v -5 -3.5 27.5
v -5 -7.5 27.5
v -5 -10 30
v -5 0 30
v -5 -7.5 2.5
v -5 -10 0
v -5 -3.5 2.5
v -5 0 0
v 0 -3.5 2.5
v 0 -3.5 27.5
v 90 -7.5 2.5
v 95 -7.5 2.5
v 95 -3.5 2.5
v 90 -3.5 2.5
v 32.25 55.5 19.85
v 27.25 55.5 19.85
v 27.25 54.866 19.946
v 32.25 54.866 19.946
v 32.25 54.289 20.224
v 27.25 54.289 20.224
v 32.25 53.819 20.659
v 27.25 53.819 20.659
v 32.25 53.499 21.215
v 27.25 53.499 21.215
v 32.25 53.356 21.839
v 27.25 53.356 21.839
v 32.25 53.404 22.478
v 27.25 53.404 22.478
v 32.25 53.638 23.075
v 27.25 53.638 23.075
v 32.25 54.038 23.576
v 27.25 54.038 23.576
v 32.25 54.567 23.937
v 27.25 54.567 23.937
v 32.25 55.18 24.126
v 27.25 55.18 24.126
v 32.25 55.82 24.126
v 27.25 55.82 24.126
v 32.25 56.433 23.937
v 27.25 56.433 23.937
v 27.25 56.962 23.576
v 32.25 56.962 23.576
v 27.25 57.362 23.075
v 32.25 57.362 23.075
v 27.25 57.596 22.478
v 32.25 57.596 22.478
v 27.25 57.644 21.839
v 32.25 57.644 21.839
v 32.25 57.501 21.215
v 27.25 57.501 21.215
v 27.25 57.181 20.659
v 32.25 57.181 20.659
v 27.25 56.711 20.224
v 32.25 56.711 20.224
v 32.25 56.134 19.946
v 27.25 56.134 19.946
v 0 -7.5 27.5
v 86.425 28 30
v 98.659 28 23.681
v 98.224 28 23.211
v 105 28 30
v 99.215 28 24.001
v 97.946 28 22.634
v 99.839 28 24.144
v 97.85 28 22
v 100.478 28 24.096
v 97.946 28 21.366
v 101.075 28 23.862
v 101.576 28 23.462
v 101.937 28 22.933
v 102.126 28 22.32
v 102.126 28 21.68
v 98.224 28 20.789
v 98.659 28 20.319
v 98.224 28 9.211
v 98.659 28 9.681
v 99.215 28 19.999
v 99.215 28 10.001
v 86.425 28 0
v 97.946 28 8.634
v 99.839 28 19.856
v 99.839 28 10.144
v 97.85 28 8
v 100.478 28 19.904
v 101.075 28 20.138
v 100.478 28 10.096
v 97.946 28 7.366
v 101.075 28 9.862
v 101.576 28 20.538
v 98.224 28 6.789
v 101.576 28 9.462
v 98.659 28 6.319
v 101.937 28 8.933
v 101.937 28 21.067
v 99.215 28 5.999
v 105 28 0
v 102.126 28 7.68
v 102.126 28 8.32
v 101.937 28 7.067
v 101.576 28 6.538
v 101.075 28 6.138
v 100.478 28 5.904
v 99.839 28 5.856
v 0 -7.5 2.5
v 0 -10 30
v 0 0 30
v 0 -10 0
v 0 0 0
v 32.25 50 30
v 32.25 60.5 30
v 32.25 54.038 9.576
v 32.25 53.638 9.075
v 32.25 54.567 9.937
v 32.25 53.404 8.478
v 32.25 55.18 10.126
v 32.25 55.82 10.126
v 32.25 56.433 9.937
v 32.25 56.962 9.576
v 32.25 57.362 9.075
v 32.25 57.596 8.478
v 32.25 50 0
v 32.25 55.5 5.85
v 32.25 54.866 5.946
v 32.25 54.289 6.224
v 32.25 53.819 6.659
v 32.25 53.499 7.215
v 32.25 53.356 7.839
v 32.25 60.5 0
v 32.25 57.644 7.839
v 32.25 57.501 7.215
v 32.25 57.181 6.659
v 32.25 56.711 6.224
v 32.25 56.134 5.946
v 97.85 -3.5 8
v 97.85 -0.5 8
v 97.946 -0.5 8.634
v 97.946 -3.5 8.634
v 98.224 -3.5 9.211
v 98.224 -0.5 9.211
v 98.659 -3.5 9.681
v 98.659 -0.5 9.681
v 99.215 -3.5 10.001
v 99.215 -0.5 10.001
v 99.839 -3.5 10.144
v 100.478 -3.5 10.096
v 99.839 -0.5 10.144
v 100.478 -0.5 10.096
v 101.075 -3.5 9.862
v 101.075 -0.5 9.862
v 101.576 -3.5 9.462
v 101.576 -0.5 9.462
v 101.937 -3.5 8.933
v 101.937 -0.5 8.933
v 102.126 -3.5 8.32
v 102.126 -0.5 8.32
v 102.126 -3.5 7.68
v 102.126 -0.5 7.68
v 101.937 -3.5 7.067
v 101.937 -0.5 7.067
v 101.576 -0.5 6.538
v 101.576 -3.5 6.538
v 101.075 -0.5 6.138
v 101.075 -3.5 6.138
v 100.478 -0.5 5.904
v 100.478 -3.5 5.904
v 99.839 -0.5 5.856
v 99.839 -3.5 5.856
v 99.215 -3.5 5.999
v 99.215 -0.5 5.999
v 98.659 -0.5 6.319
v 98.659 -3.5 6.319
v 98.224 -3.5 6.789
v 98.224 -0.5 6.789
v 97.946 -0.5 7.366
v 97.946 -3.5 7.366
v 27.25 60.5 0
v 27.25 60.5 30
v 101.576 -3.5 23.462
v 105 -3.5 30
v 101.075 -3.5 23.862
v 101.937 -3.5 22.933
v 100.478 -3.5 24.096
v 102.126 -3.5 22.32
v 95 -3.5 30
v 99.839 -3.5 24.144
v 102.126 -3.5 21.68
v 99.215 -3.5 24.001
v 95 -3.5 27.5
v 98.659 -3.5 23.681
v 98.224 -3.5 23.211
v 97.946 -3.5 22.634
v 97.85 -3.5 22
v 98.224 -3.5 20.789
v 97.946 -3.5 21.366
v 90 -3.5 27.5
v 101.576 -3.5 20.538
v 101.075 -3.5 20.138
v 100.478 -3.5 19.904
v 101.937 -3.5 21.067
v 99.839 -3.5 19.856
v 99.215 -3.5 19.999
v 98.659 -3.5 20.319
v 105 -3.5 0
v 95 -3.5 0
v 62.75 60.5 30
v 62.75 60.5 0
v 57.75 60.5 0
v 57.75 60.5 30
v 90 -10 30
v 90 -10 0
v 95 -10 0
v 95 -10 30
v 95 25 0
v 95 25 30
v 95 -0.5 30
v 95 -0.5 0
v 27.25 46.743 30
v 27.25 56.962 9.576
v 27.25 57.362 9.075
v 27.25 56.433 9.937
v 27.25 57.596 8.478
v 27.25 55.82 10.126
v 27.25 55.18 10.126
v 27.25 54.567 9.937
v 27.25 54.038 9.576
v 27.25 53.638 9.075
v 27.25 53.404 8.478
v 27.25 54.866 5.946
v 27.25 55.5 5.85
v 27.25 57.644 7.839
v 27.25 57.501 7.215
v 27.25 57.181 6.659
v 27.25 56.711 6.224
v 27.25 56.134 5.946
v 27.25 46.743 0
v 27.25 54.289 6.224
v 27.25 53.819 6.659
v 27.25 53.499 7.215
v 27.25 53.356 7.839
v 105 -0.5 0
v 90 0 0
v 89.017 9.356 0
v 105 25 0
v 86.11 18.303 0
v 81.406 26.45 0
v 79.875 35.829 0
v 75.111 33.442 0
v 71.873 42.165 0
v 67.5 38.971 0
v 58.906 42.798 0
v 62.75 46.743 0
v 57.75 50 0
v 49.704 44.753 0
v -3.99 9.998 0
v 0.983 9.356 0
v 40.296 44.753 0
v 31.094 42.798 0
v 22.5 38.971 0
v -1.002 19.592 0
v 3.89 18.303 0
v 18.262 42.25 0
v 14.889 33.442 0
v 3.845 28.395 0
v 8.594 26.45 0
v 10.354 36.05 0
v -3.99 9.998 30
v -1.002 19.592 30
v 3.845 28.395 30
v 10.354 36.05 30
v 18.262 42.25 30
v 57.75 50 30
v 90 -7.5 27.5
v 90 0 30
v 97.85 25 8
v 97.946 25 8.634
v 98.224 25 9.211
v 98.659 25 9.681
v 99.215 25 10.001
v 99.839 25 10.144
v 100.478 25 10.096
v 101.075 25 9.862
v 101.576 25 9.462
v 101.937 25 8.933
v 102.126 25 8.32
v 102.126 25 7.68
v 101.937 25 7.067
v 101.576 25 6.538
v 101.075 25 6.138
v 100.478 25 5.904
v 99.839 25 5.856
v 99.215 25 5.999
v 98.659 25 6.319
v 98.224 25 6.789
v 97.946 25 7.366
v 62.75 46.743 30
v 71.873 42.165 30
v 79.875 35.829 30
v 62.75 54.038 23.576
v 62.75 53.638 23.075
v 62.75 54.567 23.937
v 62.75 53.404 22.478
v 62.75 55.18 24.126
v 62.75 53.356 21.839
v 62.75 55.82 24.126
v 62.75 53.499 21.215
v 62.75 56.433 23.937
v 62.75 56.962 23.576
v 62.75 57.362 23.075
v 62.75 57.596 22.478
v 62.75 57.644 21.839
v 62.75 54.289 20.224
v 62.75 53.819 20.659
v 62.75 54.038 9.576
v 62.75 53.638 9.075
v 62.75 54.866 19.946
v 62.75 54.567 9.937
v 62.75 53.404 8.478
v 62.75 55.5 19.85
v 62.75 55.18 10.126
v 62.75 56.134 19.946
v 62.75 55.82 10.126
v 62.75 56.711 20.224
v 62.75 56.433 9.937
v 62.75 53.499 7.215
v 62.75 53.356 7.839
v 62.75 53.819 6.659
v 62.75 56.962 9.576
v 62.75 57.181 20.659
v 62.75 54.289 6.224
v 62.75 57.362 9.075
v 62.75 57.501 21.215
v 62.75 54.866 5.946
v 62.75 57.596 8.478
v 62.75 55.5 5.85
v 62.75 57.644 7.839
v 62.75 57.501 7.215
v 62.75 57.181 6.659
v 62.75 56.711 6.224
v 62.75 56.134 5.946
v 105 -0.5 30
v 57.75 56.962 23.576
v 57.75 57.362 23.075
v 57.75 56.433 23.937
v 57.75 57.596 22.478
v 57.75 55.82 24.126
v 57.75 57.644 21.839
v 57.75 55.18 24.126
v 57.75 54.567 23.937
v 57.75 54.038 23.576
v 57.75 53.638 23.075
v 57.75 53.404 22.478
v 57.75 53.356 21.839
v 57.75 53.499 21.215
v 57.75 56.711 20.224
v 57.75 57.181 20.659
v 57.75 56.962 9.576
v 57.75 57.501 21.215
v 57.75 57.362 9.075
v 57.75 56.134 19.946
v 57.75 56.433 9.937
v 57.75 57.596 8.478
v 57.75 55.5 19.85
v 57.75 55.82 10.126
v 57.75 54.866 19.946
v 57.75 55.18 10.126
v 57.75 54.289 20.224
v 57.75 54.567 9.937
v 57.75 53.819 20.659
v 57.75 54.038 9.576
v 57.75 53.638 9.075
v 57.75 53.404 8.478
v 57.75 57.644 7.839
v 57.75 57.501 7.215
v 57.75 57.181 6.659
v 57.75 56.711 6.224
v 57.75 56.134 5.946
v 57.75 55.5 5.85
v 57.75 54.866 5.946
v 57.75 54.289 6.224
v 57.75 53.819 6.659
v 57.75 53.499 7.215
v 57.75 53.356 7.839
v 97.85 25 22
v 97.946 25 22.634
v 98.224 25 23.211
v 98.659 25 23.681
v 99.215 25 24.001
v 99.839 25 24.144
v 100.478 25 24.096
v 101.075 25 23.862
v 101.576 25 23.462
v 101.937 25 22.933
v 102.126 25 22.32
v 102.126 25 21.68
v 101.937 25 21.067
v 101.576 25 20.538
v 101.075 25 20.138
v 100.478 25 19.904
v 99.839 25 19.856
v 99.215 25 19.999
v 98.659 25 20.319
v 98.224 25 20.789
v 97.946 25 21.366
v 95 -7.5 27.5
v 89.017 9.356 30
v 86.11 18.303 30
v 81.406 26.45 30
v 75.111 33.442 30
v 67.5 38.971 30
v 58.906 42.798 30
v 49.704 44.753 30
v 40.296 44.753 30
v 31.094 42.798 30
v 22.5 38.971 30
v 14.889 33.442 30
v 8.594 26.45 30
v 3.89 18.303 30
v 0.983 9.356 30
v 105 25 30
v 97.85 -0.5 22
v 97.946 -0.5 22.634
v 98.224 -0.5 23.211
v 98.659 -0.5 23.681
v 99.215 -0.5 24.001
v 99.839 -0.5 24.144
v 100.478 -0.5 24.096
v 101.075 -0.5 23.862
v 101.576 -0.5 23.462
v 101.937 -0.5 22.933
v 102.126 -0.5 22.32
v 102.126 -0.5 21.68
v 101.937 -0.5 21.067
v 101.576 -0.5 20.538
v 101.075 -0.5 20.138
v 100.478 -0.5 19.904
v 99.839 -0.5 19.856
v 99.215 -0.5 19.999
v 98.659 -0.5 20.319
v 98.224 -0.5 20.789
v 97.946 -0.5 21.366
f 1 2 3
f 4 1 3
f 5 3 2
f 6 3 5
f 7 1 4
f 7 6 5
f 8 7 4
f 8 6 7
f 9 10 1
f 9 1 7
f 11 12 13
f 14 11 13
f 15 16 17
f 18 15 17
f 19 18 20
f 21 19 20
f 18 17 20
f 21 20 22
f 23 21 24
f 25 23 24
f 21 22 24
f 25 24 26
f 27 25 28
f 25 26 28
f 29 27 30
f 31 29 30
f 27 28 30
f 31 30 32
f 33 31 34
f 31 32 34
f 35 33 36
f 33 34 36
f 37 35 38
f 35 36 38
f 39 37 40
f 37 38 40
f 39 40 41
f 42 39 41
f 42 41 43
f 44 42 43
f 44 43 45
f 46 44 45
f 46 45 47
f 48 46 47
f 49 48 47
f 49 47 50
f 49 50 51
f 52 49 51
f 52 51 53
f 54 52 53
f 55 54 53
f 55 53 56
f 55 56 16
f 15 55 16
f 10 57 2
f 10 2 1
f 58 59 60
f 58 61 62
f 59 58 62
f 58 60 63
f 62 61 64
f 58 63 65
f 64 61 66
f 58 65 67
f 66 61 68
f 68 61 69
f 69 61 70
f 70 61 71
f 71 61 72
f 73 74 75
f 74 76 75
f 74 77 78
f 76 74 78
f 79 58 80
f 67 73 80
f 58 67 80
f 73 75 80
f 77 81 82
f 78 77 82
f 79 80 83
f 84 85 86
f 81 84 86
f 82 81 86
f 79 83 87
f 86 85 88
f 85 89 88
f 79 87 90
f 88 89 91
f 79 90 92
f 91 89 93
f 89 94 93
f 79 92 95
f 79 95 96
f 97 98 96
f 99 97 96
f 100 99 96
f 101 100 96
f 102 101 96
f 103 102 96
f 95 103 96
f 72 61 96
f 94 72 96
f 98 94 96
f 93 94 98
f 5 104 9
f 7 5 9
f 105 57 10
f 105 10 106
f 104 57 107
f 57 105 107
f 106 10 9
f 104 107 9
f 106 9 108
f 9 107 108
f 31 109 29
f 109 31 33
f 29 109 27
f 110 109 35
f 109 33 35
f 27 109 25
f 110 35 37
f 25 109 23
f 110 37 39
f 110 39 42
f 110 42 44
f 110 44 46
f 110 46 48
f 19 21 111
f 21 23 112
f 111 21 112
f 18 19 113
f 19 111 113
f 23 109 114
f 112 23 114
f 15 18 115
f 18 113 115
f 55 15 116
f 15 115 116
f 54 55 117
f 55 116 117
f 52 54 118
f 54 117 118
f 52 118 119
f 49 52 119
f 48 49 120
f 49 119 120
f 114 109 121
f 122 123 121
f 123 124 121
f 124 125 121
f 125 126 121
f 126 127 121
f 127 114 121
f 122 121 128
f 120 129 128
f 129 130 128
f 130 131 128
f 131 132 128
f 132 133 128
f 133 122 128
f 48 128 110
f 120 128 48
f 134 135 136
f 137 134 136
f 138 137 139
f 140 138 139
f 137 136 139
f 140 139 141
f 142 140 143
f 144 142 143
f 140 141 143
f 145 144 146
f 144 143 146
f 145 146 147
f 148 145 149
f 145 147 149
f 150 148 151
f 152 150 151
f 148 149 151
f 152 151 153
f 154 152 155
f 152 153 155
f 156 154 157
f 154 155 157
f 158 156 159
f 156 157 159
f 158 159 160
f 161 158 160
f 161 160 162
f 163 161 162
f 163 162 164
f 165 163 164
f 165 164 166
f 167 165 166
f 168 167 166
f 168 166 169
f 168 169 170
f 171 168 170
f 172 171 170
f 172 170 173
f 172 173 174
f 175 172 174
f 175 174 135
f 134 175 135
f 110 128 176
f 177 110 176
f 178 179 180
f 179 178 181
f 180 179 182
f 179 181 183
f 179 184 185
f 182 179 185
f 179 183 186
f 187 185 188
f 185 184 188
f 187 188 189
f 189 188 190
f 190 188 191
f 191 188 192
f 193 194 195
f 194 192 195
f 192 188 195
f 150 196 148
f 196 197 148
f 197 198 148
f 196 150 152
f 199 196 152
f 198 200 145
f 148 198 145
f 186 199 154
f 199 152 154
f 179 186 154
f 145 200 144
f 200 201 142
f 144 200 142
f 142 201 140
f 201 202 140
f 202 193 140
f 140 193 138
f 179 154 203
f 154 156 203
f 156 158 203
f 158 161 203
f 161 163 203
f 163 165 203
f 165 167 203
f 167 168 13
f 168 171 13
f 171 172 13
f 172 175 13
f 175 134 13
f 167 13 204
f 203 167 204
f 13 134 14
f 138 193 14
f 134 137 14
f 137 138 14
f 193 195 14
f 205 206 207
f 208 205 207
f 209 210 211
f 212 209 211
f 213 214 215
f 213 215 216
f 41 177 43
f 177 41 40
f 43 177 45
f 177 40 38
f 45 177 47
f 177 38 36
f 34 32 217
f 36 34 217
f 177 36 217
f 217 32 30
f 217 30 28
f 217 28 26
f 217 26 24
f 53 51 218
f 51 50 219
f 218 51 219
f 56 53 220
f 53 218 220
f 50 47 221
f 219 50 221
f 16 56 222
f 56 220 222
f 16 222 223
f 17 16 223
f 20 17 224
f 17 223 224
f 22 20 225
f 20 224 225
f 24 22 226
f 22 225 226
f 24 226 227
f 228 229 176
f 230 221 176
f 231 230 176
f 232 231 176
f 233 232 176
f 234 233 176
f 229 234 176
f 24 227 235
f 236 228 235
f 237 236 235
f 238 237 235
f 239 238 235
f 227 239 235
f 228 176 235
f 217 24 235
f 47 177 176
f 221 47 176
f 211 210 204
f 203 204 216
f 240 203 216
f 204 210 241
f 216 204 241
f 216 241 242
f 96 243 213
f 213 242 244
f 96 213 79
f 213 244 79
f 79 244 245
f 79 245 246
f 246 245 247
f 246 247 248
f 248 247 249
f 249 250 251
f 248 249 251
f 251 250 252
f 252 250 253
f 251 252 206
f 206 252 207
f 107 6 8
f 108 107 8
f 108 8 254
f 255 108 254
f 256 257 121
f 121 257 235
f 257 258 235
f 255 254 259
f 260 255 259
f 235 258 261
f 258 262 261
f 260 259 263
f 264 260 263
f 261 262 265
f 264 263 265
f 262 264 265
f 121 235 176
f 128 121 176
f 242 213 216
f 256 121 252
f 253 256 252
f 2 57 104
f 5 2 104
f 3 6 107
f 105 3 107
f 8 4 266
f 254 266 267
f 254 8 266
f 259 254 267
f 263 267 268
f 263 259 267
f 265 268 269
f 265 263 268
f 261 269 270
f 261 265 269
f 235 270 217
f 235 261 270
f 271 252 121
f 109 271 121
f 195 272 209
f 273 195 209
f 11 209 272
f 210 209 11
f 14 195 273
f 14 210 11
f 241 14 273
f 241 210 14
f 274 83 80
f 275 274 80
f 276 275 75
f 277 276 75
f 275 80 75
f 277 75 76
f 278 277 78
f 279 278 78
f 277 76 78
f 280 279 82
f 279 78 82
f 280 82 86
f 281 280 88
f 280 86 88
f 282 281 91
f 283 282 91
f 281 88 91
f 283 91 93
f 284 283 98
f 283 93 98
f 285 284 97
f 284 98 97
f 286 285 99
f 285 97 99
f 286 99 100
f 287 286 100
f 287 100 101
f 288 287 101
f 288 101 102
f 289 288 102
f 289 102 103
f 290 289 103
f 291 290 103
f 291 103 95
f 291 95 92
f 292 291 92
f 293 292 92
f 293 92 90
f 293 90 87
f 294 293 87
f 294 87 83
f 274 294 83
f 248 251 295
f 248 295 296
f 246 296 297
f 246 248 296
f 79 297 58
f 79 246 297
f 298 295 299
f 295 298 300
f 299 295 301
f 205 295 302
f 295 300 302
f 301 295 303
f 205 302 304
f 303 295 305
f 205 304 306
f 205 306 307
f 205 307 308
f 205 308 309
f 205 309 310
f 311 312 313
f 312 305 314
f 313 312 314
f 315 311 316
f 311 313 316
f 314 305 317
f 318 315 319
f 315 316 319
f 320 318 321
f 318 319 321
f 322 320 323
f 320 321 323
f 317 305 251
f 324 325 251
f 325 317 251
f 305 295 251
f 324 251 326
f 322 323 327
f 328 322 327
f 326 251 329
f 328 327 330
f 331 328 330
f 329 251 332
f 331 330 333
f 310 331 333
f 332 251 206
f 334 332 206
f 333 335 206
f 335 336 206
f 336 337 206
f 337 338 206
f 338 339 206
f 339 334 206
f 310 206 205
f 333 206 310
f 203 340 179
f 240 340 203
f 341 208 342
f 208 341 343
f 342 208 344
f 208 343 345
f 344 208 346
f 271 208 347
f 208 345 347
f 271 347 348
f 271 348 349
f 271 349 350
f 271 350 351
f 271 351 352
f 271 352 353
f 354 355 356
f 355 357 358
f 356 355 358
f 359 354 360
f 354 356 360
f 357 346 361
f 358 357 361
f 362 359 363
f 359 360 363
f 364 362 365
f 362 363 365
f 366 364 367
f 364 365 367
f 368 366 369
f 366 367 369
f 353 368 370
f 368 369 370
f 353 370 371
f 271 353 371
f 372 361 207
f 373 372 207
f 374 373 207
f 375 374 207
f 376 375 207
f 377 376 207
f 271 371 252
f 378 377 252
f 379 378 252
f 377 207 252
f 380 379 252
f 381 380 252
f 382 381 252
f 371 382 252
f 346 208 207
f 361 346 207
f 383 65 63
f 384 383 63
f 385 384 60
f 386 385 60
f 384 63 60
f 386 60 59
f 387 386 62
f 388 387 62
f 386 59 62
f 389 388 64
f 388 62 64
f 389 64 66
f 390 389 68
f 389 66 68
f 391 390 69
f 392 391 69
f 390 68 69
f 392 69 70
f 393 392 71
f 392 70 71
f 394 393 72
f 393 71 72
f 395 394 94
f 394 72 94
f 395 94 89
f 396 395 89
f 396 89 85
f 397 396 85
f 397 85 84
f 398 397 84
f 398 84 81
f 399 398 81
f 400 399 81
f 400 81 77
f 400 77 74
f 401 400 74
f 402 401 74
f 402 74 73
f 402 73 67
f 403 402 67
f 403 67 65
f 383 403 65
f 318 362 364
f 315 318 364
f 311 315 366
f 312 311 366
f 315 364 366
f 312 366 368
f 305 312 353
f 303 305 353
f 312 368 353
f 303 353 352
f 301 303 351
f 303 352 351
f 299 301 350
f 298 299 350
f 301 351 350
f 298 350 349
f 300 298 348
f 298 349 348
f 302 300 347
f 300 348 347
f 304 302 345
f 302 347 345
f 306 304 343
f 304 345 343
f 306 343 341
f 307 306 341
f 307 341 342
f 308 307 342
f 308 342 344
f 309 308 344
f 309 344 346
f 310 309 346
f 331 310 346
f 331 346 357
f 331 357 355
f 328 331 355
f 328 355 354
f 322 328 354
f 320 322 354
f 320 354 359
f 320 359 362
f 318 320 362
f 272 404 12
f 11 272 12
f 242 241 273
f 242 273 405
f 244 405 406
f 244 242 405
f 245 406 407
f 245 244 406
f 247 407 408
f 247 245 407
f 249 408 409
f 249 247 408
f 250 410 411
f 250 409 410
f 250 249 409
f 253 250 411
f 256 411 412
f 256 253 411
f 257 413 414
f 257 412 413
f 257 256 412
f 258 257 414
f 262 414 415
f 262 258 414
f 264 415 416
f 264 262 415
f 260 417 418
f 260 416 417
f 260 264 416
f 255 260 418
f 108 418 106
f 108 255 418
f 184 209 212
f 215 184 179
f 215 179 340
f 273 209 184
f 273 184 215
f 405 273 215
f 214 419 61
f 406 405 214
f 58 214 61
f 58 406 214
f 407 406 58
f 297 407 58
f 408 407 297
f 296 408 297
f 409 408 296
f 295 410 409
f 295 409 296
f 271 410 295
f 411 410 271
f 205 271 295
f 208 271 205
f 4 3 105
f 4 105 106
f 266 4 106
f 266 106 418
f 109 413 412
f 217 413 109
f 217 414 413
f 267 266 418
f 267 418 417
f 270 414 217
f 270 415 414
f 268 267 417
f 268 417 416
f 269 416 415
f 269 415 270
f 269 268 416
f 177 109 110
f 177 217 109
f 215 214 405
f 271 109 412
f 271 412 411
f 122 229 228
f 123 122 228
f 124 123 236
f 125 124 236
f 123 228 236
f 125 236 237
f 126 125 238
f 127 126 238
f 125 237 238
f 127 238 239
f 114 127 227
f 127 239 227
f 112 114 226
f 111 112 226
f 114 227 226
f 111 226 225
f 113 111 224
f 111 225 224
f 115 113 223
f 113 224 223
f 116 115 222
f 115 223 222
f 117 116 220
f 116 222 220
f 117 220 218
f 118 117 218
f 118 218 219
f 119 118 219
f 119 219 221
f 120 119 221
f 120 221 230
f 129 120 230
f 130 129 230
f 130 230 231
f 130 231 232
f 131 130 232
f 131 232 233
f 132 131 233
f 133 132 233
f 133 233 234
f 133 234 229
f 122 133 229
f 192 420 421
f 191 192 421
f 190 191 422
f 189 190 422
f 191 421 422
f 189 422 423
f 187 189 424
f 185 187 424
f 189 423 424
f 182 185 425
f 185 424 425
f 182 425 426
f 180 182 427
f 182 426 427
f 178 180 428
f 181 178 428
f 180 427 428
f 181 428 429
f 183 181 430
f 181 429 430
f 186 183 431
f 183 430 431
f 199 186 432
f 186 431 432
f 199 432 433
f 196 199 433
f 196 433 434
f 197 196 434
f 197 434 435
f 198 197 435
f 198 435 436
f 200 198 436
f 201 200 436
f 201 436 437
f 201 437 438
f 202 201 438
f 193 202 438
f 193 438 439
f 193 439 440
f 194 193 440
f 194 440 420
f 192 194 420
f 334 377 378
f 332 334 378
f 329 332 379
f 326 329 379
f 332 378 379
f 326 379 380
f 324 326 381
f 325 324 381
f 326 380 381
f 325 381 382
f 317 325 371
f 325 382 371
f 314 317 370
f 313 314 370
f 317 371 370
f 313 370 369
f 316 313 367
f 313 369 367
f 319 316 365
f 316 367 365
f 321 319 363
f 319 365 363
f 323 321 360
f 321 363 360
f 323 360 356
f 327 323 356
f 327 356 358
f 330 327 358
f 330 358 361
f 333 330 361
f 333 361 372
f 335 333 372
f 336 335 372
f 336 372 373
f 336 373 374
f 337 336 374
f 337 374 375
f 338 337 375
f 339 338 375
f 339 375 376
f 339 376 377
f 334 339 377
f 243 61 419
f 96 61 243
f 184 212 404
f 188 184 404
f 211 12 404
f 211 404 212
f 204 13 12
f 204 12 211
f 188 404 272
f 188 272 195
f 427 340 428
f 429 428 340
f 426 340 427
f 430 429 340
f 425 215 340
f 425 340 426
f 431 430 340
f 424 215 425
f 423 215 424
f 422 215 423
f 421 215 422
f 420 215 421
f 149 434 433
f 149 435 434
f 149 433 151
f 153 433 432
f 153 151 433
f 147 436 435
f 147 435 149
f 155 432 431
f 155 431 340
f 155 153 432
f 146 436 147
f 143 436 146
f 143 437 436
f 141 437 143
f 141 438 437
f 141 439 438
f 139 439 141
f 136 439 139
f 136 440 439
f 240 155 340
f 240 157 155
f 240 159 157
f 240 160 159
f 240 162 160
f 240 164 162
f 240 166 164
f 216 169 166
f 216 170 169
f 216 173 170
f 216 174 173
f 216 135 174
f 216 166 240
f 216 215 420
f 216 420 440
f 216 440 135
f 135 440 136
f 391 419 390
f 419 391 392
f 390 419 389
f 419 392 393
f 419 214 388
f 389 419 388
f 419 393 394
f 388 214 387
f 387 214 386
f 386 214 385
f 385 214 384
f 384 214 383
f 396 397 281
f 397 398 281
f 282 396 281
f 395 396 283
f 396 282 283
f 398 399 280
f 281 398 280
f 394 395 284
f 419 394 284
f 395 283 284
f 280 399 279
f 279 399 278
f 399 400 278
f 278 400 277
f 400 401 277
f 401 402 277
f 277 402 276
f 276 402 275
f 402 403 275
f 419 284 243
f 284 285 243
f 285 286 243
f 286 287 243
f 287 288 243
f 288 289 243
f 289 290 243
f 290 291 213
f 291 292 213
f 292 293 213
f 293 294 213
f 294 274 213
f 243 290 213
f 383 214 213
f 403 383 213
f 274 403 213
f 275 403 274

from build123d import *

# Parameters (mm, degrees)
SKETCH1_W                = 5
SKETCH1_H                = 10
BOSS_EXTRUDE1_DEPTH      = 30
BOSS_EXTRUDE2_START      = -30
BOSS_EXTRUDE2_DEPTH      = 30
SKETCH3_W                = 25
SKETCH3_H                = 4
CUT_EXTRUDE1_DEPTH       = 121.665860955
BOSS_EXTRUDE3_REACH      = 122.666
BOSS_EXTRUDE3_END_RADIUS = 50
SKETCH4_W                = 30
SKETCH4_H                = 31.5
SKETCH5_W                = 30
SKETCH5_H                = 3
BOSS_EXTRUDE4_DEPTH      = 10
SKETCH6_R                = 2.15
CUT_EXTRUDE2_DEPTH       = 103.982097959
SKETCH7_R                = 2.15
CUT_EXTRUDE3_DEPTH       = 116.62439189


with BuildPart() as part:
    # Sketch1 → Boss-Extrude1 (new body)
    with BuildSketch(Plane.XY):
        with BuildLine():
            ThreePointArc((-5, 0), (45, 50), (95, 0))
            Line((95, 0), (90, 0))
            ThreePointArc((90, 0), (45, 45), (0, 0))
            Line((0, 0), (-5, 0))
        make_face()
        with Locations((92.5, -5)):
            Rectangle(SKETCH1_W, SKETCH1_H)
        with Locations((-2.5, -5)):
            Rectangle(SKETCH1_W, SKETCH1_H)
    extrude(amount=BOSS_EXTRUDE1_DEPTH)

    # Sketch2 → Boss-Extrude2 (add)
    with BuildSketch(Plane.XY.offset(30).offset(BOSS_EXTRUDE2_START)):
        with BuildLine():
            Line((32.25, 48.347052651), (32.25, 50))
            Line((32.25, 50), (32.25, 60.5))
            Line((32.25, 60.5), (27.25, 60.5))
            Line((27.25, 60.5), (27.25, 46.74331503))
            ThreePointArc((27.25, 46.74331503), (29.728932795, 47.610865424), (32.25, 48.347052651))
        make_face()
        with BuildLine():
            ThreePointArc((32.25, 48.347052651), (38.571649999, 49.585041255), (45, 50))
            Line((45, 50), (32.25, 50))
            Line((32.25, 50), (32.25, 48.347052651))
        make_face()
        with BuildLine():
            Line((32.25, 45), (45, 45))
            Line((45, 45), (45, 50))
            ThreePointArc((45, 50), (38.571649999, 49.585041255), (32.25, 48.347052651))
            Line((32.25, 48.347052651), (32.25, 45))
        make_face()
        with BuildLine():
            Line((45, 45), (57.75, 45))
            Line((57.75, 45), (57.75, 48.347052651))
            ThreePointArc((57.75, 48.347052651), (51.428350001, 49.585041255), (45, 50))
            Line((45, 50), (45, 45))
        make_face()
        with BuildLine():
            ThreePointArc((45, 50), (51.428350001, 49.585041255), (57.75, 48.347052651))
            Line((57.75, 48.347052651), (57.75, 50))
            Line((57.75, 50), (45, 50))
        make_face()
        with BuildLine():
            Line((57.75, 50), (57.75, 48.347052651))
            ThreePointArc((57.75, 48.347052651), (60.271067205, 47.610865424), (62.75, 46.74331503))
            Line((62.75, 46.74331503), (62.75, 60.5))
            Line((62.75, 60.5), (57.75, 60.5))
            Line((57.75, 60.5), (57.75, 50))
        make_face()
        with BuildLine():
            Line((27.25, 45), (32.25, 45))
            Line((32.25, 45), (32.25, 48.347052651))
            ThreePointArc((32.25, 48.347052651), (29.728932795, 47.610865424), (27.25, 46.74331503))
            Line((27.25, 46.74331503), (27.25, 45))
        make_face()
        with BuildLine():
            Line((57.75, 48.347052651), (57.75, 45))
            Line((57.75, 45), (62.75, 45))
            Line((62.75, 45), (62.75, 46.74331503))
            ThreePointArc((62.75, 46.74331503), (60.271067205, 47.610865424), (57.75, 48.347052651))
        make_face()
    extrude(amount=BOSS_EXTRUDE2_DEPTH)

    # Sketch3 → Cut-Extrude1 (cut, through all)
    with BuildSketch(Plane(origin=(95, 0, 0), x_dir=(0, 0, -1), z_dir=(1, 0, 0))):
        with Locations((-15, -5.5)):
            Rectangle(SKETCH3_W, SKETCH3_H)
    extrude(amount=-CUT_EXTRUDE1_DEPTH, mode=Mode.SUBTRACT)

    # Boss-Extrude3: up to this cylinder (the profile starts outside it)
    boss_extrude3_end = Plane(origin=(45, 0, 15), z_dir=(0, 0, -1)) * Cylinder(BOSS_EXTRUDE3_END_RADIUS, 346.332, mode=Mode.PRIVATE)
    # Sketch4 → Boss-Extrude3 (add, up to the surface)
    with BuildSketch(Plane(origin=(95, 0, 0), x_dir=(0, 0, -1), z_dir=(1, 0, 0)), mode=Mode.PRIVATE) as boss_extrude3_sk1:
        with Locations((-15, 12.25)):
            Rectangle(SKETCH4_W, SKETCH4_H)
    boss_extrude3_tool1 = extrude(boss_extrude3_sk1.sketch, amount=-BOSS_EXTRUDE3_REACH, mode=Mode.PRIVATE) - boss_extrude3_end
    add(boss_extrude3_tool1.solids().sort_by_distance((95, 12.25, 15))[0])
    add(boss_extrude3_tool1.solids().sort_by_distance((95, 12.25, 15))[1])

    # Sketch5 → Boss-Extrude4 (add)
    with BuildSketch(Plane(origin=(95, 0, 0), x_dir=(0, 0, -1), z_dir=(1, 0, 0))):
        with Locations((-15, -2)):
            Rectangle(SKETCH5_W, SKETCH5_H)
        with Locations((-15, 26.5)):
            Rectangle(SKETCH5_W, SKETCH5_H)
    extrude(amount=BOSS_EXTRUDE4_DEPTH)

    # Sketch6 → Cut-Extrude2 (cut, through all)
    with BuildSketch(Plane.ZY.offset(-27.25)):
        with Locations(Location((22, 55.5, 0), (0, 0, 180))):
            Circle(SKETCH6_R)
        with Locations(Location((8, 55.5, 0), (0, 0, 180))):
            Circle(SKETCH6_R)
    extrude(amount=-CUT_EXTRUDE2_DEPTH, mode=Mode.SUBTRACT)

    # Sketch7 → Cut-Extrude3 (cut, through all)
    with BuildSketch(Plane(origin=(0, 28, 0), x_dir=(1, 0, 0), z_dir=(0, 1, 0))):
        with Locations(Location((100, -22, 0), (0, 0, 180))):
            Circle(SKETCH7_R)
        with Locations(Location((100, -8, 0), (0, 0, 180))):
            Circle(SKETCH7_R)
    extrude(amount=-CUT_EXTRUDE3_DEPTH, mode=Mode.SUBTRACT)


solid = part.part
